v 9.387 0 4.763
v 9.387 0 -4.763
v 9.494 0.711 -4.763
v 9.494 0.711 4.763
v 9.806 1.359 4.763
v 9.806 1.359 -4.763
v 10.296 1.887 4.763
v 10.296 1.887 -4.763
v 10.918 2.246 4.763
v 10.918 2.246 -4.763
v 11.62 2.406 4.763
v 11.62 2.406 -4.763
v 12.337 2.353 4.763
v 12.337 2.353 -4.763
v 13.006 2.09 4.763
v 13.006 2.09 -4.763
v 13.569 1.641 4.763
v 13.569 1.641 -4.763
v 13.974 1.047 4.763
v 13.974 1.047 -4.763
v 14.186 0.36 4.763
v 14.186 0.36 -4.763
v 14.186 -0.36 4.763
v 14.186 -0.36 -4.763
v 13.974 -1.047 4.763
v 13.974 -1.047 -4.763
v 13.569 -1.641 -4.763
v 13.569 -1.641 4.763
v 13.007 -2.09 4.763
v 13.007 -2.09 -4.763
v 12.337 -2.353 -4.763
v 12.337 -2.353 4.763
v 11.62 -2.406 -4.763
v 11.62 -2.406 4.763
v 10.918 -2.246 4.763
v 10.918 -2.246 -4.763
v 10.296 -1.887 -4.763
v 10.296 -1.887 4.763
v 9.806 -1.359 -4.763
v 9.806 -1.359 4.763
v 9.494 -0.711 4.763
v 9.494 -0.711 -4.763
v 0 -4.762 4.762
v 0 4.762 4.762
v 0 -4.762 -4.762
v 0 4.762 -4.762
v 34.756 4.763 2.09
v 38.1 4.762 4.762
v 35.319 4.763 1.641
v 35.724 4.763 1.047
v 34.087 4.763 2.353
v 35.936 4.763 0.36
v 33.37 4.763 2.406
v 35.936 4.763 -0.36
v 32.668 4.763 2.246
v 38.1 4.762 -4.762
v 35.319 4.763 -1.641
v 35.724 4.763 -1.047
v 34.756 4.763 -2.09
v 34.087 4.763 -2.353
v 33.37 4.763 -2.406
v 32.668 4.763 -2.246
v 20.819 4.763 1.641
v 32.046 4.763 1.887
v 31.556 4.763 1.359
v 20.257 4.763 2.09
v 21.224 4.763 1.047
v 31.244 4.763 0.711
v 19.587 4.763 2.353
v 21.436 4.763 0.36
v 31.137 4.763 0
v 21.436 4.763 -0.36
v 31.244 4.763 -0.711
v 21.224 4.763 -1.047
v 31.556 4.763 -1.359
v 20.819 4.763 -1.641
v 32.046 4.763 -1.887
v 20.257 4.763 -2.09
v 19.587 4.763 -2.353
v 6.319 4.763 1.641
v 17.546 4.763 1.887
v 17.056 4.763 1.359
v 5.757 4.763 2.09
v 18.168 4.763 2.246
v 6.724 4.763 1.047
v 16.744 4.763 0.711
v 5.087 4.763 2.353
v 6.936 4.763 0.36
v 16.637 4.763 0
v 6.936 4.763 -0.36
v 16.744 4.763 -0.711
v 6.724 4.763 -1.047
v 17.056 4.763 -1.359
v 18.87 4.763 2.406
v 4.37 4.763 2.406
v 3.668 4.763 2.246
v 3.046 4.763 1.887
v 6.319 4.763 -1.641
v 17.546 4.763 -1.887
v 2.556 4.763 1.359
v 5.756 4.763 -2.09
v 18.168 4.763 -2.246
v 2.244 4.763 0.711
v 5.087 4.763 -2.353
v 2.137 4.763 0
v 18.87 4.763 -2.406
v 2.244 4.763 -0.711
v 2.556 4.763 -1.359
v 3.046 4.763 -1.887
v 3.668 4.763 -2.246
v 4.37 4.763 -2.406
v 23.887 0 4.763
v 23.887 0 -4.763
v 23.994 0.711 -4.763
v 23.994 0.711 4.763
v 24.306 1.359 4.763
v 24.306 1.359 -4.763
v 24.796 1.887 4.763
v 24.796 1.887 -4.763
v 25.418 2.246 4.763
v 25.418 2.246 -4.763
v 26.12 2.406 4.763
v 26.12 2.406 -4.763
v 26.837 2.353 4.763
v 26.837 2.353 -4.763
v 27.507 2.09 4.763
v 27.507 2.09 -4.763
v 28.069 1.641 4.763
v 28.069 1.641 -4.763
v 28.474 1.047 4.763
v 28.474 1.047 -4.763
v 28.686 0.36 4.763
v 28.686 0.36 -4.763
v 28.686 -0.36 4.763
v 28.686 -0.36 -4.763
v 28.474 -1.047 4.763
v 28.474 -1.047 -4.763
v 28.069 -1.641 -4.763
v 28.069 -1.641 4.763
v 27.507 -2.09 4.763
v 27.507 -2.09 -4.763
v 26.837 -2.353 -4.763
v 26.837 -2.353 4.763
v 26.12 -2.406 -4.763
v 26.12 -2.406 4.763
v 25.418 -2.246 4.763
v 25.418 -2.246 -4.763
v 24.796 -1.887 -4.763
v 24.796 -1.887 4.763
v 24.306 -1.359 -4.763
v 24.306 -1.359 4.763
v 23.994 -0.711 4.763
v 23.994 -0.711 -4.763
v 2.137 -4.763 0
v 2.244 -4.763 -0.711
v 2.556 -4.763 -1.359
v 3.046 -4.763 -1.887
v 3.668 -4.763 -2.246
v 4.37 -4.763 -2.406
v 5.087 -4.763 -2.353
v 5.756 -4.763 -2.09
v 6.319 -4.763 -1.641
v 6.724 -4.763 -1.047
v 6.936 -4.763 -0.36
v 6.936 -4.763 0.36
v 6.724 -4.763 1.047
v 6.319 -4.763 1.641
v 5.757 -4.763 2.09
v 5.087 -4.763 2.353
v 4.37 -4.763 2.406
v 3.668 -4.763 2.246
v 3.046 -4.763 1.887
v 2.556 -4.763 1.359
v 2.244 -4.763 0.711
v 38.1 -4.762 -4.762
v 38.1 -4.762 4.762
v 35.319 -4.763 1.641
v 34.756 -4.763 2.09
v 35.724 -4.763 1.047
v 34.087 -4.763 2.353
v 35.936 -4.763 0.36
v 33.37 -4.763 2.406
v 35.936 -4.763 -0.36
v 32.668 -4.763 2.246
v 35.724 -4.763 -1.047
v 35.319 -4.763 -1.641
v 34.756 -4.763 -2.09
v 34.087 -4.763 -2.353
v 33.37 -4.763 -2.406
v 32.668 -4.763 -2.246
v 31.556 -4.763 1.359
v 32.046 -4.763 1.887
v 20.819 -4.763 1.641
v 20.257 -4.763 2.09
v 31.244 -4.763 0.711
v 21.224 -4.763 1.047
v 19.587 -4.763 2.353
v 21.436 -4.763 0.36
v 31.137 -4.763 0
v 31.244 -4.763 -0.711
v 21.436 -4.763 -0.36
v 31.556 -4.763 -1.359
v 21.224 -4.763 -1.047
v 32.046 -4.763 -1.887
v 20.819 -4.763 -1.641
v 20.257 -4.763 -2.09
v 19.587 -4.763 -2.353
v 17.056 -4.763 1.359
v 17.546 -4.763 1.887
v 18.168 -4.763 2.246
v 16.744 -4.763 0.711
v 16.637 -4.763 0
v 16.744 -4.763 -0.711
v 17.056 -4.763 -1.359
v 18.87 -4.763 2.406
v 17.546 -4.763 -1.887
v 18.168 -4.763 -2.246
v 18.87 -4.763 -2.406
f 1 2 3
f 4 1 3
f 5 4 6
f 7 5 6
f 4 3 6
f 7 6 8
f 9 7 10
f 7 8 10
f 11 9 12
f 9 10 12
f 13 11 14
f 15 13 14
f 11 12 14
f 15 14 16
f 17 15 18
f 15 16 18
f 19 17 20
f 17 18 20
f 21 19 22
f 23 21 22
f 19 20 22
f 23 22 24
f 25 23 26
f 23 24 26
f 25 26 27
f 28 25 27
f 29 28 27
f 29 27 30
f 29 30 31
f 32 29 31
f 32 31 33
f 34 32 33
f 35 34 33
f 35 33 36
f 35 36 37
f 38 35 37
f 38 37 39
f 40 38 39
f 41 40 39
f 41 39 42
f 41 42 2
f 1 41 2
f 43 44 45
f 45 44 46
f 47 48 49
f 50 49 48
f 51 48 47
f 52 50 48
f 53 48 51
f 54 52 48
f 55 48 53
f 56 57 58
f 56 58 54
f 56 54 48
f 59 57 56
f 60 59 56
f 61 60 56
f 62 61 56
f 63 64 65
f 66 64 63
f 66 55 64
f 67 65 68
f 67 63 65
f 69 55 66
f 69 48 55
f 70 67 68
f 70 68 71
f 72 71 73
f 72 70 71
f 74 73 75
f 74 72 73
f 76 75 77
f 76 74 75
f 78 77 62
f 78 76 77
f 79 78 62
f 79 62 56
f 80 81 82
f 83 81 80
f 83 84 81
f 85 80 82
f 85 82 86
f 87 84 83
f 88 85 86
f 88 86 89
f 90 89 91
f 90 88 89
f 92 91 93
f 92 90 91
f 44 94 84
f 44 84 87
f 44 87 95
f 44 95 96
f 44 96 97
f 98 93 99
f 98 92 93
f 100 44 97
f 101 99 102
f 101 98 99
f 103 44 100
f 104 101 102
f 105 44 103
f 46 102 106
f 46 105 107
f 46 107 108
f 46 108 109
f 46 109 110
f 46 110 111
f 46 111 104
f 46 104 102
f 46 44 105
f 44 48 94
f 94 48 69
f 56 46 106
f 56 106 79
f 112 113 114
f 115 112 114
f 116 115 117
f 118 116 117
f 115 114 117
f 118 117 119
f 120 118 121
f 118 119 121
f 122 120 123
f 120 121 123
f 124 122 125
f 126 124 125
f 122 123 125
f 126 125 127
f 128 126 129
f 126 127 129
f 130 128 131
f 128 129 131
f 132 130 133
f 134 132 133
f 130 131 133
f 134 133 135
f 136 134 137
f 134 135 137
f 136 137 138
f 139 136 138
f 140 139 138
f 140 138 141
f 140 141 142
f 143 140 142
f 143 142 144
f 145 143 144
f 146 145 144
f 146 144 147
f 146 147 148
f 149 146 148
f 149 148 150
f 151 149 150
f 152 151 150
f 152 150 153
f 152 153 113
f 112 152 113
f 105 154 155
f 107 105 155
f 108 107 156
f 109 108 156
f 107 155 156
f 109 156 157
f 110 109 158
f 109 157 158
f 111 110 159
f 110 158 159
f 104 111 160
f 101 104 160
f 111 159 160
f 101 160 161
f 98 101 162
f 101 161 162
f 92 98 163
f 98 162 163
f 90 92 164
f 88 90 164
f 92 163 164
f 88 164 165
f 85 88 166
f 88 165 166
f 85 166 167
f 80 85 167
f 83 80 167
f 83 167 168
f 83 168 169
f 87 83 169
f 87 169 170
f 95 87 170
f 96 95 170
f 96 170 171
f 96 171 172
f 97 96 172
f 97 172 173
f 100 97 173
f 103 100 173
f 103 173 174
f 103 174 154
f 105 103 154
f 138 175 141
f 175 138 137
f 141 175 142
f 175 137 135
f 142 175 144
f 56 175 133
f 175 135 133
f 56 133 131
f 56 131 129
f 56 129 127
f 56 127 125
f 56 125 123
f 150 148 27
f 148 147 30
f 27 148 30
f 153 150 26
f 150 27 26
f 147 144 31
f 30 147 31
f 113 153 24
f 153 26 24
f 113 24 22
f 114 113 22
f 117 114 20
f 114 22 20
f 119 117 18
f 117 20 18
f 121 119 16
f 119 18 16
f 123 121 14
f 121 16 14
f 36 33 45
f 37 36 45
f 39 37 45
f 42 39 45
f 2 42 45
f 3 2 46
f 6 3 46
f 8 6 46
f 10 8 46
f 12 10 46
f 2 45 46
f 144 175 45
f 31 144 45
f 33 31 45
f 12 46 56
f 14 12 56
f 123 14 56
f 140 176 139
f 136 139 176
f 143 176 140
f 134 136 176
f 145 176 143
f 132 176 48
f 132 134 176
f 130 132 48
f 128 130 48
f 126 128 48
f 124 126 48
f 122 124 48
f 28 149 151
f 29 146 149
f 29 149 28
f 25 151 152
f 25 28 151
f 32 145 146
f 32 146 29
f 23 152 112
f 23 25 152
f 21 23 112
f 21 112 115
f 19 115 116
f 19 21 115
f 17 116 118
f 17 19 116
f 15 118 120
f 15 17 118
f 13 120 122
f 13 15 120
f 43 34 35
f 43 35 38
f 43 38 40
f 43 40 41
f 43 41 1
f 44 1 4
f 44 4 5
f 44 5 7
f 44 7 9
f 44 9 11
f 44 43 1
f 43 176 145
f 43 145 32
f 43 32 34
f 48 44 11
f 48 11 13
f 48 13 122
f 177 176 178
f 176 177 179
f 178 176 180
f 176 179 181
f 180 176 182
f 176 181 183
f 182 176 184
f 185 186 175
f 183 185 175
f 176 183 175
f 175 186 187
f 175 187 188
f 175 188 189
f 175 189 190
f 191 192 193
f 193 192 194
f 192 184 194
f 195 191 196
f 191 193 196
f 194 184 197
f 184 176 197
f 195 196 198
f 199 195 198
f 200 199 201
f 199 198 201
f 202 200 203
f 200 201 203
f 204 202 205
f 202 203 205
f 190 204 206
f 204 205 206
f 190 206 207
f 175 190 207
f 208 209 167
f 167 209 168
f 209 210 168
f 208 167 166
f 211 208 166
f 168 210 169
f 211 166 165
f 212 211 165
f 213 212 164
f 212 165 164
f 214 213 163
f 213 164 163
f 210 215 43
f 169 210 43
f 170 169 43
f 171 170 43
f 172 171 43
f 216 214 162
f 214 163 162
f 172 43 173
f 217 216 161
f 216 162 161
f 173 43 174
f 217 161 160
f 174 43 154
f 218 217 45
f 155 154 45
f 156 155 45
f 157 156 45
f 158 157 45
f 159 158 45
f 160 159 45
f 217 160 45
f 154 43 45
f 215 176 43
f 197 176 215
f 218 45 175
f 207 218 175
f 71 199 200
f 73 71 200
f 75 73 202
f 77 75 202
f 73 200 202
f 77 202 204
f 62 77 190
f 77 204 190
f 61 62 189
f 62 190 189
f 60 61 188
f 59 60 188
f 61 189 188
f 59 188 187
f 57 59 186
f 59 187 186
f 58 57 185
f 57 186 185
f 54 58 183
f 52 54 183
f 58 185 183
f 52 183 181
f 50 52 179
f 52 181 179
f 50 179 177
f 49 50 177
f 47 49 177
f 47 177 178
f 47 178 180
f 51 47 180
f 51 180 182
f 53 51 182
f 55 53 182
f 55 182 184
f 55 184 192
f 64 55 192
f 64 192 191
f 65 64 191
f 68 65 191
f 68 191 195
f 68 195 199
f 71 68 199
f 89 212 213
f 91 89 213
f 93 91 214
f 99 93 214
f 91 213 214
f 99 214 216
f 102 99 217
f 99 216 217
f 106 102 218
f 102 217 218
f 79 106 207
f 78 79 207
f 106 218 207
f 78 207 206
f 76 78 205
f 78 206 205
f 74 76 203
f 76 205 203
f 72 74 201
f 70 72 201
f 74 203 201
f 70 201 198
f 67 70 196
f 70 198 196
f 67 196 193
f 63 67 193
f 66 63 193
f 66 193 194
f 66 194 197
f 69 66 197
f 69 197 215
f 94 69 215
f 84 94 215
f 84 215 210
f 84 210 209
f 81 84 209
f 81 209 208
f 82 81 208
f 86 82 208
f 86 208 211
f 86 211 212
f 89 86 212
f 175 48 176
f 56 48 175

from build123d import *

# Parameters (mm, degrees)
SKETCH1_W              = 9.525
SKETCH1_H              = 9.525
BOSS_EXTRUDE1_DEPTH    = 38.1
F_10_24_TAPPED_HOLE1_D = 4.826
F_10_24_TAPPED_HOLE2_D = 4.826


with BuildPart() as part:
    # Sketch1 → Boss-Extrude1 (new body)
    with BuildSketch(Plane(origin=(0, 0, 0), x_dir=(0, 0, -1), z_dir=(1, 0, 0))):
        Rectangle(SKETCH1_W, SKETCH1_H)
    extrude(amount=BOSS_EXTRUDE1_DEPTH)

    # #10-24 Tapped Hole1 (through all)
    with Locations(Plane(origin=(0, 4.7625, 0), x_dir=(1, 0, 0), z_dir=(0, 1, 0))):
        with Locations((4.55, 0), (19.05, 0), (33.55, 0)):
            Hole(F_10_24_TAPPED_HOLE1_D / 2)

    # #10-24 Tapped Hole2 (through all)
    with Locations(Plane.XY.offset(4.7625)):
        with Locations((11.8, 0), (26.3, 0)):
            Hole(F_10_24_TAPPED_HOLE2_D / 2)


solid = part.part
